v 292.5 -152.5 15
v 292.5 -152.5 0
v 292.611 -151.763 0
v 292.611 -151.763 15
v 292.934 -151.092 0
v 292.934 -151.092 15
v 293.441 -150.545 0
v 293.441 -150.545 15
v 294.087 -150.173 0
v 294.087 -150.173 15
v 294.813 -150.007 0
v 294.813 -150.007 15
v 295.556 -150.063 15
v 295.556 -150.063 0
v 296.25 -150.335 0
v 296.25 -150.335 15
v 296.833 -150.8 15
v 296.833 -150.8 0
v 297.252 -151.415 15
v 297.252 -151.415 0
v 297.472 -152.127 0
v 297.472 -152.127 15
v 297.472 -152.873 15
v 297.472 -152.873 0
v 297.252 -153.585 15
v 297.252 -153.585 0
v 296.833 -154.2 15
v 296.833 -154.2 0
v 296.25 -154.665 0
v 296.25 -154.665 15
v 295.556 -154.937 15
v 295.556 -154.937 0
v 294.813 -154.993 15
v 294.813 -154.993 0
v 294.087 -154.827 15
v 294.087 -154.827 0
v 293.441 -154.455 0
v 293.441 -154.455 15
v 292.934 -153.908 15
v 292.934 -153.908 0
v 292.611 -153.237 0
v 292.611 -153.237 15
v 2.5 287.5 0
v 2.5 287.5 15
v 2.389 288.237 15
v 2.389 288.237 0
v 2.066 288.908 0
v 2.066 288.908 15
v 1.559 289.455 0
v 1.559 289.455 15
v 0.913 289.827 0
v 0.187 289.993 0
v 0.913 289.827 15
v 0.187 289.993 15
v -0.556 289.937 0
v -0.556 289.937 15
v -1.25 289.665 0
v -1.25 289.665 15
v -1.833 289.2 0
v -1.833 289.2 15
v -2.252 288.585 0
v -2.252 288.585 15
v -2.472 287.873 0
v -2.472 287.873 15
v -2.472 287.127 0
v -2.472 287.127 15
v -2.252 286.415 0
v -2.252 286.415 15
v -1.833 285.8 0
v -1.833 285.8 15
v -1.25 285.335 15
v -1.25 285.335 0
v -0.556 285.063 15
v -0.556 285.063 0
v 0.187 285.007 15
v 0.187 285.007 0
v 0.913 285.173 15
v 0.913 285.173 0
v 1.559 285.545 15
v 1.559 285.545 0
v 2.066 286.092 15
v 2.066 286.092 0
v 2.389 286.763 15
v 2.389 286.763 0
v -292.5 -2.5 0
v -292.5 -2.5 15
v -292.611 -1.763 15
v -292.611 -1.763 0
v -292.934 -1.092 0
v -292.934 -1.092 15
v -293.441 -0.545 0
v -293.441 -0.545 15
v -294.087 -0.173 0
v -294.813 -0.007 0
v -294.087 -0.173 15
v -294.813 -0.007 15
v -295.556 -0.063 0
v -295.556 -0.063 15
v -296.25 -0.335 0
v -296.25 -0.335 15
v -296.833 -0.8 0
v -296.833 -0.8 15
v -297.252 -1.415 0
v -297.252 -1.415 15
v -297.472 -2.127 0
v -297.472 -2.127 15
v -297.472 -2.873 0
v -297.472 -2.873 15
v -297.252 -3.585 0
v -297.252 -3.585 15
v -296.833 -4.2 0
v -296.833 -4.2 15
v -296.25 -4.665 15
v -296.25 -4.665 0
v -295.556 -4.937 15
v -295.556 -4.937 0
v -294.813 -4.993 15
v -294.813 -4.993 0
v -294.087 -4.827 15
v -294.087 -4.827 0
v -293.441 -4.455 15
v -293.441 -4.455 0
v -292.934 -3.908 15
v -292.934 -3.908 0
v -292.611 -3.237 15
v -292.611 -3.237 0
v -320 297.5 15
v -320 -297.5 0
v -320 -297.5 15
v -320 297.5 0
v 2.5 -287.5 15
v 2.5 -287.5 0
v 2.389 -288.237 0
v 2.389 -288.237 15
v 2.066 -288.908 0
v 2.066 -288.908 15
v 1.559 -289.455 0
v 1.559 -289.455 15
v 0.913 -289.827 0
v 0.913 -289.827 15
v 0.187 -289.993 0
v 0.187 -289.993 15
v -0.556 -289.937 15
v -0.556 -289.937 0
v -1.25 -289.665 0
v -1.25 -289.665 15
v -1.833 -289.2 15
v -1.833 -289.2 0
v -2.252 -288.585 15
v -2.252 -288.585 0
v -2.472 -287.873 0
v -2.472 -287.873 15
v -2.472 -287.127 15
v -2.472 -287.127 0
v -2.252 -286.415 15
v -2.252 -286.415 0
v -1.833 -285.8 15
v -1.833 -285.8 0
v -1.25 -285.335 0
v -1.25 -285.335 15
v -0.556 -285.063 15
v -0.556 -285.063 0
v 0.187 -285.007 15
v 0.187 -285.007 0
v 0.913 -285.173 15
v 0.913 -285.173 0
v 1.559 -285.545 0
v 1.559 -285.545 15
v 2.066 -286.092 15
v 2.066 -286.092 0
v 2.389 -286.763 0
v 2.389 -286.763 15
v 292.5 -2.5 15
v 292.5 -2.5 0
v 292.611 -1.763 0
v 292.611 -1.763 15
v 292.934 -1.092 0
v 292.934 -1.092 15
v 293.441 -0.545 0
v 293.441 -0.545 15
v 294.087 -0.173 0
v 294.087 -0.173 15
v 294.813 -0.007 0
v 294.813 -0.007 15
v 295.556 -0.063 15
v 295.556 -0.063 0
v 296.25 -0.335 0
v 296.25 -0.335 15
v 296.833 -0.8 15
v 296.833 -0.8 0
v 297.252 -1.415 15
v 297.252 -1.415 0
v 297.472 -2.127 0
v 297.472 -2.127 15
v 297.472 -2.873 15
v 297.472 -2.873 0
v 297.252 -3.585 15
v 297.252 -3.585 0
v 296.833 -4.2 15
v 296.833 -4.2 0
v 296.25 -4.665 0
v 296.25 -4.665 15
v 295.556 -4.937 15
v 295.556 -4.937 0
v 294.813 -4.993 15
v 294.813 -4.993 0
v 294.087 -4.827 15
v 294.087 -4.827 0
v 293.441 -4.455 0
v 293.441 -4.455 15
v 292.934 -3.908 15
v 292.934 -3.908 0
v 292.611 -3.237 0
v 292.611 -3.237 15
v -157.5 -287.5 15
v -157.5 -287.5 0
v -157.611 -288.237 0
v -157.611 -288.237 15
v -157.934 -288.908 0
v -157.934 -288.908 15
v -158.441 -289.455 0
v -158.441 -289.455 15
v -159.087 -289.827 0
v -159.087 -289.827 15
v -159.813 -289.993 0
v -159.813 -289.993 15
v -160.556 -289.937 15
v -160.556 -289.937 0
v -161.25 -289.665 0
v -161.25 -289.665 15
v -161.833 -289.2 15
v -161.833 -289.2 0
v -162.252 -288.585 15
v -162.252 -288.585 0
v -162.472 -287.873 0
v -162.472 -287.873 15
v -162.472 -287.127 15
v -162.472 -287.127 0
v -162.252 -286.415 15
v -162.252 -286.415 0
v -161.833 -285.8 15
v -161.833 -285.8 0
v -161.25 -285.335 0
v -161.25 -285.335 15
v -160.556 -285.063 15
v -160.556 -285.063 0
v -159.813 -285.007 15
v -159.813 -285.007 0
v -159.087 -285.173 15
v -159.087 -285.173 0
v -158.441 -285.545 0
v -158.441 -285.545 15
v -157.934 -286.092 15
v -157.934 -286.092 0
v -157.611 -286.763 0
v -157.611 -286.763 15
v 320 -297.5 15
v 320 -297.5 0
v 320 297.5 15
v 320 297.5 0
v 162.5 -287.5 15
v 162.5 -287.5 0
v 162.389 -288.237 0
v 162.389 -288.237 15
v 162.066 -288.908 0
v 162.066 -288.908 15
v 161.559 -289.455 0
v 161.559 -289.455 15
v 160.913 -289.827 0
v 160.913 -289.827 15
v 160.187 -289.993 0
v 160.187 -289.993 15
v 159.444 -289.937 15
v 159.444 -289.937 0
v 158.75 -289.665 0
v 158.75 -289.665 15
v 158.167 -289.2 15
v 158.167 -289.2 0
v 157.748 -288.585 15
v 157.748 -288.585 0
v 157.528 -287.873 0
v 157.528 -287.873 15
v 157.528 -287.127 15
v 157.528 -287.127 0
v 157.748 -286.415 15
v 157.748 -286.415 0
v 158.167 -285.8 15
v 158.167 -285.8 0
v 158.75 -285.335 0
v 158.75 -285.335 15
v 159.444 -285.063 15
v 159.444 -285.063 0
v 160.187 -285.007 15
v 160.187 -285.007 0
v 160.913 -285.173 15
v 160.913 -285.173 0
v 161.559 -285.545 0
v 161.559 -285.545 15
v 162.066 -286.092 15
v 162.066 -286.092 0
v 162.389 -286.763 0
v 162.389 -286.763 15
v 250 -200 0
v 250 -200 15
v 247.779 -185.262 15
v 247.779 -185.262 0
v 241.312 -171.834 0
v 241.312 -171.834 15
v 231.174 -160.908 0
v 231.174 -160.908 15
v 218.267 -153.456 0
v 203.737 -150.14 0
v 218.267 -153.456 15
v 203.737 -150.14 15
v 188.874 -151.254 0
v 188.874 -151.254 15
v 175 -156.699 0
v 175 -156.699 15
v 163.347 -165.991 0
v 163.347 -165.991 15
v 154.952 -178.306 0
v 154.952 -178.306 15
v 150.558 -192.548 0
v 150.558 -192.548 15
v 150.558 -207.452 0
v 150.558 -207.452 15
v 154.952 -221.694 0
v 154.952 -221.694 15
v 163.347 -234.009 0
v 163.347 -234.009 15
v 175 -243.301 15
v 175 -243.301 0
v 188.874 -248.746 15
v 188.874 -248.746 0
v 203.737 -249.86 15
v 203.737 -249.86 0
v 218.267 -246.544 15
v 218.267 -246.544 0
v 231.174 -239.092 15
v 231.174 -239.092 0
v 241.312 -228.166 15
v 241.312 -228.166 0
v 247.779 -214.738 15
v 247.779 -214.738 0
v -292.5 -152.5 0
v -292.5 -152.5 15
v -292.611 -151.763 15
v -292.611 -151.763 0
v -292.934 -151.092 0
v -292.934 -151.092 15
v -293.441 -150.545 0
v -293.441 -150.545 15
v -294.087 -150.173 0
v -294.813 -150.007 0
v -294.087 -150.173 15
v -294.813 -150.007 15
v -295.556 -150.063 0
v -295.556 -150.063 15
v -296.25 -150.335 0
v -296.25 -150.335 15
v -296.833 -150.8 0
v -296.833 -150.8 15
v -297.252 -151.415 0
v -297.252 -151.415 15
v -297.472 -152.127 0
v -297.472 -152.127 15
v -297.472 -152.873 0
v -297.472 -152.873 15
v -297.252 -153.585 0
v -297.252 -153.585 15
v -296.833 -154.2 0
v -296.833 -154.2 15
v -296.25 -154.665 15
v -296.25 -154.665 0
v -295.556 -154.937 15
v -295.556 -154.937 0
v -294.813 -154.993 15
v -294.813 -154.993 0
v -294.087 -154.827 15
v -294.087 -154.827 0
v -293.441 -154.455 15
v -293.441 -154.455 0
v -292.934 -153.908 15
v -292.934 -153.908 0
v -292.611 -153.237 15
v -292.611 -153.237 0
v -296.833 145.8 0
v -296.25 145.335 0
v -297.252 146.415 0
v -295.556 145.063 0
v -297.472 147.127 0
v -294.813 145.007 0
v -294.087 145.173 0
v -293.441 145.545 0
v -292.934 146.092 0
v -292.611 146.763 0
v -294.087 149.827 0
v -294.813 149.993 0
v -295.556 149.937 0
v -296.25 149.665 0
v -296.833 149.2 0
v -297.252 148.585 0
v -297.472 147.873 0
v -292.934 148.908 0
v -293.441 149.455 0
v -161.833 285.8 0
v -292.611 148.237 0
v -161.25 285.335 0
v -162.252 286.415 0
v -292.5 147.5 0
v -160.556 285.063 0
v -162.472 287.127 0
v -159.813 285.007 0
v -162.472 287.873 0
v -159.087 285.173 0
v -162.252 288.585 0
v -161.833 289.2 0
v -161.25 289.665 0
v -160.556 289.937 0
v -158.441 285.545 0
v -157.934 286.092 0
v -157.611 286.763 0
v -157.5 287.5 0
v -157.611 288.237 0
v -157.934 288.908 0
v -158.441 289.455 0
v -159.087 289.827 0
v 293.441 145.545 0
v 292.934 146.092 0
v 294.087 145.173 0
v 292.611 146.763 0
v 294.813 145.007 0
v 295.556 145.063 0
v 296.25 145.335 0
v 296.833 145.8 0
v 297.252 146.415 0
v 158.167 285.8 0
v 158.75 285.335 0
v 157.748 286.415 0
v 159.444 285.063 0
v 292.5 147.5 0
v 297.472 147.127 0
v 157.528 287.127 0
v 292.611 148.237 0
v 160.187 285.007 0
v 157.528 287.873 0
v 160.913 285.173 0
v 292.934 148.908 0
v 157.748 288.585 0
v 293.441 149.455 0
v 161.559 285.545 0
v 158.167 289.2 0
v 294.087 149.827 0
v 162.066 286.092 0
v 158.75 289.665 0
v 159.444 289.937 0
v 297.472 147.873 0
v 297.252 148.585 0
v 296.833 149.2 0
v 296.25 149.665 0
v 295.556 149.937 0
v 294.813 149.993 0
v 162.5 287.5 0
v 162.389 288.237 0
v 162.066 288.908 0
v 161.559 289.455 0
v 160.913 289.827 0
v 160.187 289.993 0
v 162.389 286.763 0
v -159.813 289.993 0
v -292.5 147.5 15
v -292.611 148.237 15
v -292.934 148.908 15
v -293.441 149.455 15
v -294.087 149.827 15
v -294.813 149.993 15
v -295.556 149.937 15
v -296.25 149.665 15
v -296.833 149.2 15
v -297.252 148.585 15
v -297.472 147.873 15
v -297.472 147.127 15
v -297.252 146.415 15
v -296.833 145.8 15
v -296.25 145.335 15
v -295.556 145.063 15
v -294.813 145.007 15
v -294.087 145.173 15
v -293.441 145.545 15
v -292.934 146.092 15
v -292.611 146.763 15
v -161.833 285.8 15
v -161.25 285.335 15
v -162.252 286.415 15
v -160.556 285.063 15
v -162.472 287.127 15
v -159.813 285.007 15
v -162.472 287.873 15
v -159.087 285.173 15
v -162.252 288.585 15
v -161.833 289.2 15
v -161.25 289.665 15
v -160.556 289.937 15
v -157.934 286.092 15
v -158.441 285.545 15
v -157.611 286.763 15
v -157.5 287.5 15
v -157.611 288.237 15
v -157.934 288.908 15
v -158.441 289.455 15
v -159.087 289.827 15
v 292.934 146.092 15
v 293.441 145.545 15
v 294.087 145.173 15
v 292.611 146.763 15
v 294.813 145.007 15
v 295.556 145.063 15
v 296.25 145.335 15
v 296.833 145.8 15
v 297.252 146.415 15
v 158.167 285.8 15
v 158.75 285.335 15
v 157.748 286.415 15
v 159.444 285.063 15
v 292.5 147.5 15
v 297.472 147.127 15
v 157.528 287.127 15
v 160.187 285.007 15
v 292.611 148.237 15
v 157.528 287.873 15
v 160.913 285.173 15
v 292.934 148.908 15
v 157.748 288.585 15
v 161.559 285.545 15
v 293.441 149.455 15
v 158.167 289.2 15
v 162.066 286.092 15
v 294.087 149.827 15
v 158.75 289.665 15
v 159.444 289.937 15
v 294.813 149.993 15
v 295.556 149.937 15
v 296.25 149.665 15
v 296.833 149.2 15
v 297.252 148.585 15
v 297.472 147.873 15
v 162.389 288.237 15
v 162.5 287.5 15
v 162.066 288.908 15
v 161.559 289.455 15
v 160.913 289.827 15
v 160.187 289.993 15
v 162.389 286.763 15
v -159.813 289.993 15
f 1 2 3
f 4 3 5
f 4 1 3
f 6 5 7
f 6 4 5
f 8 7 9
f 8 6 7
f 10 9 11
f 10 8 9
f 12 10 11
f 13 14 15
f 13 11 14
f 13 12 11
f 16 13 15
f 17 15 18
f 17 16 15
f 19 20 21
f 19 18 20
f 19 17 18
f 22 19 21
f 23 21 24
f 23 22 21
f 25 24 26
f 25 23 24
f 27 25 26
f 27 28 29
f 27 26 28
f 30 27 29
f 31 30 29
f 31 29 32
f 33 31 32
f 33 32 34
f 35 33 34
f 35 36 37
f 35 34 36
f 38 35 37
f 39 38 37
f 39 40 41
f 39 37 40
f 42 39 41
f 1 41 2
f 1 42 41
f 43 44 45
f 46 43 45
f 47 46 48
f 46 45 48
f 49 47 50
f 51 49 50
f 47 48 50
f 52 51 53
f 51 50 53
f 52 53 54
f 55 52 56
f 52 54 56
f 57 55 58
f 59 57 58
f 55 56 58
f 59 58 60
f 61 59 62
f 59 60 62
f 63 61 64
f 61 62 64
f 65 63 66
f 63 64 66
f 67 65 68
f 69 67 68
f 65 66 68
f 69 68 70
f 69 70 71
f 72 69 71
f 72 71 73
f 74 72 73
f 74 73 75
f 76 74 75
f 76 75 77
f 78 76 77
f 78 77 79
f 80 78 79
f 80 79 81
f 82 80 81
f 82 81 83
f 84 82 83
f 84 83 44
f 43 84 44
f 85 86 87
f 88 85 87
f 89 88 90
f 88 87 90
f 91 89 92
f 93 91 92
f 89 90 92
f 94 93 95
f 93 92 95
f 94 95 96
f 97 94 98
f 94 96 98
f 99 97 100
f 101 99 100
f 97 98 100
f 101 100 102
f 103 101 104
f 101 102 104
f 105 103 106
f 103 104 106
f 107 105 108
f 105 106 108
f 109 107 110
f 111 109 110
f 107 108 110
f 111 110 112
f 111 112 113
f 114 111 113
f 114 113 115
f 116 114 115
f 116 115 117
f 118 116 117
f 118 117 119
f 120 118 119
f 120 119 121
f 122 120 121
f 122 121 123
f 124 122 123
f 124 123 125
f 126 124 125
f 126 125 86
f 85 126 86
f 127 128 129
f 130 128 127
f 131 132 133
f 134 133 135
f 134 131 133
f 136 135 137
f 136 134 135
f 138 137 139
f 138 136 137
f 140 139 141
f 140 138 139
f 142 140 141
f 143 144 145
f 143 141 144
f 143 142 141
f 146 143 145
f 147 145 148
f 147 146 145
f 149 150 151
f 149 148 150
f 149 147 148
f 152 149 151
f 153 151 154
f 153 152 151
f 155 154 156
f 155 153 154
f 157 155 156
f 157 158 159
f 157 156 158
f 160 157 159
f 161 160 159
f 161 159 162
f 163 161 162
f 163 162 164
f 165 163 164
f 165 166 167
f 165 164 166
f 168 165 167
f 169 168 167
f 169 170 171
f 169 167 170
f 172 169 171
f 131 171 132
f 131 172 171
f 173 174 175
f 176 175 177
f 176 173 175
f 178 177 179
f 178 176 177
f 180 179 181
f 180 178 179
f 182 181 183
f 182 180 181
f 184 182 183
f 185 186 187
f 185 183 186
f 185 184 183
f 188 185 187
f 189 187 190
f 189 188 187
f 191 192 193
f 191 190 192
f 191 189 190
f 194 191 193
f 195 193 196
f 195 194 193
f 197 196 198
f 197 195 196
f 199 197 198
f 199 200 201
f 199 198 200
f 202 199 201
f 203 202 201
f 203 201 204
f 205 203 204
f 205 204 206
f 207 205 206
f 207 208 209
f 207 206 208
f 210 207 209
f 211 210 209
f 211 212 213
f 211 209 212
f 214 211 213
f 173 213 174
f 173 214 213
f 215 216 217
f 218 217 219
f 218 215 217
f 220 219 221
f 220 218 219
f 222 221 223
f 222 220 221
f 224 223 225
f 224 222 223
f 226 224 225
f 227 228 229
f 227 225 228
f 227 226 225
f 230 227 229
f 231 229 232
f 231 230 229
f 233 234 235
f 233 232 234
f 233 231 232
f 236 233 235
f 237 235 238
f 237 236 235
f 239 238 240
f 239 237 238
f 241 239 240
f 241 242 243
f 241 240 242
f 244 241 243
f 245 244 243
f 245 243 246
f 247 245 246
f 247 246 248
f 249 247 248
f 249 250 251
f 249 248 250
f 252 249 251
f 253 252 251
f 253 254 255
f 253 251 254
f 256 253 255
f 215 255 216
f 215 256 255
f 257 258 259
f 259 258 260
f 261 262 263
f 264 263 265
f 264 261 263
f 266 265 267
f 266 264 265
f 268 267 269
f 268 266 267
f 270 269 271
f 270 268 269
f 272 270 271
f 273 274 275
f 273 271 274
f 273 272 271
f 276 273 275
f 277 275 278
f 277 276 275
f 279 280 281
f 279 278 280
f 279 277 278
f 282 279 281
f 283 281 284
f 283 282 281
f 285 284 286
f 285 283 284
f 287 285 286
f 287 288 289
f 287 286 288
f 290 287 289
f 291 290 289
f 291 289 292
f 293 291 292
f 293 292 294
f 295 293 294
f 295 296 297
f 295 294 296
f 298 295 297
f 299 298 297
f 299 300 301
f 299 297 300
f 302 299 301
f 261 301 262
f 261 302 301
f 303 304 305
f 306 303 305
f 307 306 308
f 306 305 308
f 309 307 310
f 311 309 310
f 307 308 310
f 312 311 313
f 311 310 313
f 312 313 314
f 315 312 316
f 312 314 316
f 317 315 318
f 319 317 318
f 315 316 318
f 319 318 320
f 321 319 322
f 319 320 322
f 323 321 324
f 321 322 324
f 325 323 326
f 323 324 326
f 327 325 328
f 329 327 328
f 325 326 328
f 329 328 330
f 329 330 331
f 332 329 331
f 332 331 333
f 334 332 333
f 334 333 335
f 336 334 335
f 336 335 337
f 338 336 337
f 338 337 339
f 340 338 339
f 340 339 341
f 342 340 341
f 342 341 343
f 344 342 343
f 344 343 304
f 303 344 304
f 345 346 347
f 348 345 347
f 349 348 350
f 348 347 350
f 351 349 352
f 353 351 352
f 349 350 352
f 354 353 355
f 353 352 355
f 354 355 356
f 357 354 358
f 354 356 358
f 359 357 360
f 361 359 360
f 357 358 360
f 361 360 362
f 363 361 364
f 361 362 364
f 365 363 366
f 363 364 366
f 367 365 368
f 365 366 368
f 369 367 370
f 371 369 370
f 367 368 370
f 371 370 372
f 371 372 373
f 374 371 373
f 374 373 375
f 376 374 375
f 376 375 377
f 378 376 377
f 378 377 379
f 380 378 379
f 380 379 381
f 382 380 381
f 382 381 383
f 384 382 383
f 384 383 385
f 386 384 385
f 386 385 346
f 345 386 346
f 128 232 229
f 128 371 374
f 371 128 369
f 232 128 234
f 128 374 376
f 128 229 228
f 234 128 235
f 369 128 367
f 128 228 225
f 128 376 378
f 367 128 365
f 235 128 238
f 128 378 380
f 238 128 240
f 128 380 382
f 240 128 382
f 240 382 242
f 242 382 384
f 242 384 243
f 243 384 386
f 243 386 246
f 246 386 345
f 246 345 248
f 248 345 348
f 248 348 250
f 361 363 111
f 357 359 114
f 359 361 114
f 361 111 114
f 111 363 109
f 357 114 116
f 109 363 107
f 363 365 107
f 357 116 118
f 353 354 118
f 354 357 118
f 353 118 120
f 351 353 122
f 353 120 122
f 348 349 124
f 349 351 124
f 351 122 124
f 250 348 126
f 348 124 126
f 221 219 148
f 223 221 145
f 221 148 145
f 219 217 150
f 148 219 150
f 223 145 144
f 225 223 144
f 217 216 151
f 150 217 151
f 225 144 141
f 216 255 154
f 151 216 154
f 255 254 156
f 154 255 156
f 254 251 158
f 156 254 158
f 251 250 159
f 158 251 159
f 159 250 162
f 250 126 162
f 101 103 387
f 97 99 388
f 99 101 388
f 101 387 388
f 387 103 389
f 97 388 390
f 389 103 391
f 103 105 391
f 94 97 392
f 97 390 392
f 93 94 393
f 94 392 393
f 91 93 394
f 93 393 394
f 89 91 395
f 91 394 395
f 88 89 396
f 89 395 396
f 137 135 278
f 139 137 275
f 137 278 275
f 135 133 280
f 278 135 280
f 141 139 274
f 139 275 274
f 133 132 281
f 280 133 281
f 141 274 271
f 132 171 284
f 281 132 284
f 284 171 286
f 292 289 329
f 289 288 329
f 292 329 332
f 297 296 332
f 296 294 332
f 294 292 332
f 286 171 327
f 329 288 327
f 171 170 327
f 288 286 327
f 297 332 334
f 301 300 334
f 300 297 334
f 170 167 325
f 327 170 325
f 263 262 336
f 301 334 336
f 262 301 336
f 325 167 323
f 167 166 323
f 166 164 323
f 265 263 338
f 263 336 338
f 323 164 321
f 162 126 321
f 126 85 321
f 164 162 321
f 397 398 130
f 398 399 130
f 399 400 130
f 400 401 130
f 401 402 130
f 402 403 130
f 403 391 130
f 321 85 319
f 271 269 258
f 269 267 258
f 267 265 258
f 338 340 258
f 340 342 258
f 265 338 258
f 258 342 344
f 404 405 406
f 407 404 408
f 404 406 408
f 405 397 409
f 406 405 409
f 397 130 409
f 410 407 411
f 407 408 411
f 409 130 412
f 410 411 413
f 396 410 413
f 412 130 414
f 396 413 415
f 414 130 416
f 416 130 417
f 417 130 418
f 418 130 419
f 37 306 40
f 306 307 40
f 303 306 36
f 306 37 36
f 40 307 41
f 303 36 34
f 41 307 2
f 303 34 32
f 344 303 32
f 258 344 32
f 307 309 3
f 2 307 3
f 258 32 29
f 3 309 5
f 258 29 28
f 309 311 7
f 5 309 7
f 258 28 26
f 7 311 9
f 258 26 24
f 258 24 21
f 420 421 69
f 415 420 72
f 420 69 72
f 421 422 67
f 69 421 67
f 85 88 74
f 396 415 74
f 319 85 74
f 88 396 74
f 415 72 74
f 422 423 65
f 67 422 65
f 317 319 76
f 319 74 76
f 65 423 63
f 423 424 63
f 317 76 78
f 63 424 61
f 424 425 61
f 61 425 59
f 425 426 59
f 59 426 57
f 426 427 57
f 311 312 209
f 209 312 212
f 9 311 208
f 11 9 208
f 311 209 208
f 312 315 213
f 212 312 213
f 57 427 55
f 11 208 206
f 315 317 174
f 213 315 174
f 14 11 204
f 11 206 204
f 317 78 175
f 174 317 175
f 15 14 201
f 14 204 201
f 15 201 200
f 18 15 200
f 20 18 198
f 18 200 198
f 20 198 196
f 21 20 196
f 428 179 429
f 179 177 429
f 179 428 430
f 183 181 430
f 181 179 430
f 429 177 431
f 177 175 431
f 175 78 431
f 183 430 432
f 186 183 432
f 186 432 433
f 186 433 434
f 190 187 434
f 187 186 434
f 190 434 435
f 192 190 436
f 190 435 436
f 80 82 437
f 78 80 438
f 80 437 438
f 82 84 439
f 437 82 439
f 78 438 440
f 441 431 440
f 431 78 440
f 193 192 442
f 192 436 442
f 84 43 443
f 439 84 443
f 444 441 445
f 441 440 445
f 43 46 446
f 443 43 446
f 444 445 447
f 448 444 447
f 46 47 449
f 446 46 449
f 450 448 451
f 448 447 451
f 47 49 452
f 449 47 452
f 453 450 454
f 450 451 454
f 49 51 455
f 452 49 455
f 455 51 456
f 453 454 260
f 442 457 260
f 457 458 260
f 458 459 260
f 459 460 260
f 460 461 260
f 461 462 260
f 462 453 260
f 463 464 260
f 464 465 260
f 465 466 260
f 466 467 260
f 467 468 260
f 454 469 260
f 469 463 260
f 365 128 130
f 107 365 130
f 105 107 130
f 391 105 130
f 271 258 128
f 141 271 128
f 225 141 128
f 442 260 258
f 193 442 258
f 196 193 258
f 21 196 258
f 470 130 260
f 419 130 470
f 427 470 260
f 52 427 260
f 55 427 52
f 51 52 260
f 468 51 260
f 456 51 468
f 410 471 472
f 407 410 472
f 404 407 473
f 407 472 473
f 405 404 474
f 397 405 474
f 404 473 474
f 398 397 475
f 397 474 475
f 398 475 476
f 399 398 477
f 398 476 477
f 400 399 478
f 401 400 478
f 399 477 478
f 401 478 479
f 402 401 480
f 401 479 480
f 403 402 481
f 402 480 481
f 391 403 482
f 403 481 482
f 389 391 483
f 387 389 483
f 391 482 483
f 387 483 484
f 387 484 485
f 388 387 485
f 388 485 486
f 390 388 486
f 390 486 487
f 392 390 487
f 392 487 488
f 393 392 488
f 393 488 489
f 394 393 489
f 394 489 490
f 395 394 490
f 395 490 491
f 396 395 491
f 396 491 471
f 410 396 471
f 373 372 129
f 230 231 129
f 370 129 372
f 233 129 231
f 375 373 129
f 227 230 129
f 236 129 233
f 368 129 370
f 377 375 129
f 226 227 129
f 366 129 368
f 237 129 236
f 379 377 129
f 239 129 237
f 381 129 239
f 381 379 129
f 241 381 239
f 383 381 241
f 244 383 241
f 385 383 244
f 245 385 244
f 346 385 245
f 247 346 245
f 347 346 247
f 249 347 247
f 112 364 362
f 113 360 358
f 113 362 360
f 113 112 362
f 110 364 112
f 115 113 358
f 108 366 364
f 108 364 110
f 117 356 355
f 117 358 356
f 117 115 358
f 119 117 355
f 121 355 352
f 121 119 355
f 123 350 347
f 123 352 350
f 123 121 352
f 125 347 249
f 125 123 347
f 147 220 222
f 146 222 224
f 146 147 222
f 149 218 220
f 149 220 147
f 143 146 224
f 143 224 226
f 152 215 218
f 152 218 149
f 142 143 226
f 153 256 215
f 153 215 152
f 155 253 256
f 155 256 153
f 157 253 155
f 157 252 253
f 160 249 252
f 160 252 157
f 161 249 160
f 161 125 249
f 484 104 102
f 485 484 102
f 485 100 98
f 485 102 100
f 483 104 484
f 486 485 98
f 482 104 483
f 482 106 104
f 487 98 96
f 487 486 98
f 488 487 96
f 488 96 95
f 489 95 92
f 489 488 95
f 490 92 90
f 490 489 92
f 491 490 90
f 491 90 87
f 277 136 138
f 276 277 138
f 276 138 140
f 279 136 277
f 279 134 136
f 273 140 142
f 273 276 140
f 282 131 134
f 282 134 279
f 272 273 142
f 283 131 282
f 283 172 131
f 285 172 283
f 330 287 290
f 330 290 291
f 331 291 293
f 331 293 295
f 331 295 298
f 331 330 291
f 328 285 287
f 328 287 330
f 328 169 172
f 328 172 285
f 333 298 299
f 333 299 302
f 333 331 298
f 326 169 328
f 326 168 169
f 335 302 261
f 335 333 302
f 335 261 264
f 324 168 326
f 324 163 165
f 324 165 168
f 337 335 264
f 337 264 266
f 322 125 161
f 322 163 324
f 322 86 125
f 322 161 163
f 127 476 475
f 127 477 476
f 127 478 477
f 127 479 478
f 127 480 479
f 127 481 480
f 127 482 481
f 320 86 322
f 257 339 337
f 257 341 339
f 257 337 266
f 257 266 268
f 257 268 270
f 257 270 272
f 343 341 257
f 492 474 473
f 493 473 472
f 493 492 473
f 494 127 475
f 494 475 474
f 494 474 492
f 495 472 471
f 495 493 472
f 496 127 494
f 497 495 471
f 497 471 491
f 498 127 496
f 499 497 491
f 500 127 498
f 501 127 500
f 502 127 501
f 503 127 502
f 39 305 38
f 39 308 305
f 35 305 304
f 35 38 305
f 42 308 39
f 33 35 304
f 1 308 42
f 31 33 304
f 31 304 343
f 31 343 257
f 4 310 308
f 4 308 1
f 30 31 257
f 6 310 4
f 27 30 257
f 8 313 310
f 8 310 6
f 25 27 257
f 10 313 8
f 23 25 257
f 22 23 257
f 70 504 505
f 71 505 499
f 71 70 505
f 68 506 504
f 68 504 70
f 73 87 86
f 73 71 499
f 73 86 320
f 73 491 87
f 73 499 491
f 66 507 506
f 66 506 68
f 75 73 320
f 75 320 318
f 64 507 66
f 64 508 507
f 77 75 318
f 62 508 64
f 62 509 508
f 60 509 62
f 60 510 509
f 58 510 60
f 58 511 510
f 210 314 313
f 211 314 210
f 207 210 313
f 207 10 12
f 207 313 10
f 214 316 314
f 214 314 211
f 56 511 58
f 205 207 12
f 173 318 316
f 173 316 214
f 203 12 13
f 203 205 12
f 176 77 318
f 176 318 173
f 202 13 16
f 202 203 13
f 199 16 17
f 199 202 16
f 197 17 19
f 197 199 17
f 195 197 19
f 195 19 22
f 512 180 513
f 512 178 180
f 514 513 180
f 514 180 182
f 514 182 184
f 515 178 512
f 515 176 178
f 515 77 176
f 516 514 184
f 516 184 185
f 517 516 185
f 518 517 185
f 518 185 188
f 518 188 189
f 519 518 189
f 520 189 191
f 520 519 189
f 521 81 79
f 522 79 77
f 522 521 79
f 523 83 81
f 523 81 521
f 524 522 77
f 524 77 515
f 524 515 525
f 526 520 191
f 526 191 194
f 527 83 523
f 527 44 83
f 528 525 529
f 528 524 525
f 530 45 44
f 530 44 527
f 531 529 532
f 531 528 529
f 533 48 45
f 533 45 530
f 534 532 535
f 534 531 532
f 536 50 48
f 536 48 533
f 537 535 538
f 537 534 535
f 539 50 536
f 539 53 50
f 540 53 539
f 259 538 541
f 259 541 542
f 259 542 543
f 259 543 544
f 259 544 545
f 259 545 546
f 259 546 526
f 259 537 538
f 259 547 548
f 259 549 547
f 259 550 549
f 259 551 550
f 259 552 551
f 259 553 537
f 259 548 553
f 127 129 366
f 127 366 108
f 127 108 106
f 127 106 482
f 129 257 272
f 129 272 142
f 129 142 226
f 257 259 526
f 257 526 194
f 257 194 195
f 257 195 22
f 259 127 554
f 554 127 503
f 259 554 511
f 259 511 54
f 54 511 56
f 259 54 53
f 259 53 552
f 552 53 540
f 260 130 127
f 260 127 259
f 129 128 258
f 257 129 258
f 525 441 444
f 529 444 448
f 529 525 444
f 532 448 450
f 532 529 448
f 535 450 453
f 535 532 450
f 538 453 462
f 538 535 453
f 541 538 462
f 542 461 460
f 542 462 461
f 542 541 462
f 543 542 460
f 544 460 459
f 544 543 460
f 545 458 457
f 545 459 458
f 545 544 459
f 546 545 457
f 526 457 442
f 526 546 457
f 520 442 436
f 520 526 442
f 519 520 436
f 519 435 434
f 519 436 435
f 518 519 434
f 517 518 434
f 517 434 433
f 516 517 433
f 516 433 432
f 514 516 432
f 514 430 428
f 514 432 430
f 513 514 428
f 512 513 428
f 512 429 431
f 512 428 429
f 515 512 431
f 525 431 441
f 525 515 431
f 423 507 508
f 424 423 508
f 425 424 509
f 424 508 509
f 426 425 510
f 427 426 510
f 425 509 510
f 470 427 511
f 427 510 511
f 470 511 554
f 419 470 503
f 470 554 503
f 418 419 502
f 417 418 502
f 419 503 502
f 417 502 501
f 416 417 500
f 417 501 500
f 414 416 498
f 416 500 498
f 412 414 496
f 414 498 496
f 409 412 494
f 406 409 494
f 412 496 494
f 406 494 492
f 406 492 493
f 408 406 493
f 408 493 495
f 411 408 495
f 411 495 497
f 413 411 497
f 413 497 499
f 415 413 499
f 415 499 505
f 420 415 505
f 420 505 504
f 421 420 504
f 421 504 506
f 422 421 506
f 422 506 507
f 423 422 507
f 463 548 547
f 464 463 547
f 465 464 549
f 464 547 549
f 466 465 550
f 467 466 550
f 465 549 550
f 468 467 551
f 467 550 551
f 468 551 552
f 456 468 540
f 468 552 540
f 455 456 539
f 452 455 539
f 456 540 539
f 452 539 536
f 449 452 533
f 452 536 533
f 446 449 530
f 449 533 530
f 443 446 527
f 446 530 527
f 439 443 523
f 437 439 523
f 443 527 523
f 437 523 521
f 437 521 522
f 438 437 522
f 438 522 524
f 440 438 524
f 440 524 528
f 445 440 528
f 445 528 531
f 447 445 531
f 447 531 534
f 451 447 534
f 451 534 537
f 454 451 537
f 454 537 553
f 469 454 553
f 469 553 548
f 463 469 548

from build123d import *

# Parameters (mm, degrees)
SKETCH_1_W          = 640
SKETCH_1_H          = 595
EXTRUDE_1_DEPTH     = 15
SKETCH_2_R          = 2.5
CUT_EXTRUDE_1_DEPTH = 16
SKETCH_2_3_R        = 2.5
CUT_EXTRUDE_2_DEPTH = 16
SKETCH_3_R          = 50
CUT_EXTRUDE_3_DEPTH = 16


with BuildPart() as part:
    # ｽｹｯﾁ1 → ﾎﾞｽ - 押し出し1 (new body)
    with BuildSketch(Plane.XY):
        Rectangle(SKETCH_1_W, SKETCH_1_H)
    extrude(amount=EXTRUDE_1_DEPTH)

    # ｽｹｯﾁ2 → ｶｯﾄ - 押し出し1 (cut, through all)
    with BuildSketch(Plane.XY.offset(15)):
        with Locations((-160, 287.5)):
            Circle(SKETCH_2_R)
        with Locations((0, 287.5)):
            Circle(SKETCH_2_R)
        with Locations((160, 287.5)):
            Circle(SKETCH_2_R)
    cut_extrude_1 = extrude(amount=-CUT_EXTRUDE_1_DEPTH, mode=Mode.SUBTRACT)

    # ｽｹｯﾁ2<3> → ｶｯﾄ - 押し出し2 (cut, through all)
    with BuildSketch(Plane.XY.offset(15)):
        with Locations((-295, 147.5)):
            Circle(SKETCH_2_3_R)
        with Locations((-295, -2.5)):
            Circle(SKETCH_2_3_R)
        with Locations((-295, -152.5)):
            Circle(SKETCH_2_3_R)
    cut_extrude_2 = extrude(amount=-CUT_EXTRUDE_2_DEPTH, mode=Mode.SUBTRACT)

    # ﾐﾗｰ1: ｶｯﾄ - 押し出し1 across plane
    add(cut_extrude_1.mirror(Plane.ZX), mode=Mode.SUBTRACT)

    # ﾐﾗｰ2: ｶｯﾄ - 押し出し2 across plane
    add(cut_extrude_2.mirror(Plane(origin=(0, 0, 0), x_dir=(0, 0, 1), z_dir=(1, 0, 0))), mode=Mode.SUBTRACT)

    # ｽｹｯﾁ3 → ｶｯﾄ - 押し出し3 (cut, through all)
    with BuildSketch(Plane.XY.offset(15)):
        with Locations((200, -200)):
            Circle(SKETCH_3_R)
    extrude(amount=-CUT_EXTRUDE_3_DEPTH, mode=Mode.SUBTRACT)


solid = part.part
